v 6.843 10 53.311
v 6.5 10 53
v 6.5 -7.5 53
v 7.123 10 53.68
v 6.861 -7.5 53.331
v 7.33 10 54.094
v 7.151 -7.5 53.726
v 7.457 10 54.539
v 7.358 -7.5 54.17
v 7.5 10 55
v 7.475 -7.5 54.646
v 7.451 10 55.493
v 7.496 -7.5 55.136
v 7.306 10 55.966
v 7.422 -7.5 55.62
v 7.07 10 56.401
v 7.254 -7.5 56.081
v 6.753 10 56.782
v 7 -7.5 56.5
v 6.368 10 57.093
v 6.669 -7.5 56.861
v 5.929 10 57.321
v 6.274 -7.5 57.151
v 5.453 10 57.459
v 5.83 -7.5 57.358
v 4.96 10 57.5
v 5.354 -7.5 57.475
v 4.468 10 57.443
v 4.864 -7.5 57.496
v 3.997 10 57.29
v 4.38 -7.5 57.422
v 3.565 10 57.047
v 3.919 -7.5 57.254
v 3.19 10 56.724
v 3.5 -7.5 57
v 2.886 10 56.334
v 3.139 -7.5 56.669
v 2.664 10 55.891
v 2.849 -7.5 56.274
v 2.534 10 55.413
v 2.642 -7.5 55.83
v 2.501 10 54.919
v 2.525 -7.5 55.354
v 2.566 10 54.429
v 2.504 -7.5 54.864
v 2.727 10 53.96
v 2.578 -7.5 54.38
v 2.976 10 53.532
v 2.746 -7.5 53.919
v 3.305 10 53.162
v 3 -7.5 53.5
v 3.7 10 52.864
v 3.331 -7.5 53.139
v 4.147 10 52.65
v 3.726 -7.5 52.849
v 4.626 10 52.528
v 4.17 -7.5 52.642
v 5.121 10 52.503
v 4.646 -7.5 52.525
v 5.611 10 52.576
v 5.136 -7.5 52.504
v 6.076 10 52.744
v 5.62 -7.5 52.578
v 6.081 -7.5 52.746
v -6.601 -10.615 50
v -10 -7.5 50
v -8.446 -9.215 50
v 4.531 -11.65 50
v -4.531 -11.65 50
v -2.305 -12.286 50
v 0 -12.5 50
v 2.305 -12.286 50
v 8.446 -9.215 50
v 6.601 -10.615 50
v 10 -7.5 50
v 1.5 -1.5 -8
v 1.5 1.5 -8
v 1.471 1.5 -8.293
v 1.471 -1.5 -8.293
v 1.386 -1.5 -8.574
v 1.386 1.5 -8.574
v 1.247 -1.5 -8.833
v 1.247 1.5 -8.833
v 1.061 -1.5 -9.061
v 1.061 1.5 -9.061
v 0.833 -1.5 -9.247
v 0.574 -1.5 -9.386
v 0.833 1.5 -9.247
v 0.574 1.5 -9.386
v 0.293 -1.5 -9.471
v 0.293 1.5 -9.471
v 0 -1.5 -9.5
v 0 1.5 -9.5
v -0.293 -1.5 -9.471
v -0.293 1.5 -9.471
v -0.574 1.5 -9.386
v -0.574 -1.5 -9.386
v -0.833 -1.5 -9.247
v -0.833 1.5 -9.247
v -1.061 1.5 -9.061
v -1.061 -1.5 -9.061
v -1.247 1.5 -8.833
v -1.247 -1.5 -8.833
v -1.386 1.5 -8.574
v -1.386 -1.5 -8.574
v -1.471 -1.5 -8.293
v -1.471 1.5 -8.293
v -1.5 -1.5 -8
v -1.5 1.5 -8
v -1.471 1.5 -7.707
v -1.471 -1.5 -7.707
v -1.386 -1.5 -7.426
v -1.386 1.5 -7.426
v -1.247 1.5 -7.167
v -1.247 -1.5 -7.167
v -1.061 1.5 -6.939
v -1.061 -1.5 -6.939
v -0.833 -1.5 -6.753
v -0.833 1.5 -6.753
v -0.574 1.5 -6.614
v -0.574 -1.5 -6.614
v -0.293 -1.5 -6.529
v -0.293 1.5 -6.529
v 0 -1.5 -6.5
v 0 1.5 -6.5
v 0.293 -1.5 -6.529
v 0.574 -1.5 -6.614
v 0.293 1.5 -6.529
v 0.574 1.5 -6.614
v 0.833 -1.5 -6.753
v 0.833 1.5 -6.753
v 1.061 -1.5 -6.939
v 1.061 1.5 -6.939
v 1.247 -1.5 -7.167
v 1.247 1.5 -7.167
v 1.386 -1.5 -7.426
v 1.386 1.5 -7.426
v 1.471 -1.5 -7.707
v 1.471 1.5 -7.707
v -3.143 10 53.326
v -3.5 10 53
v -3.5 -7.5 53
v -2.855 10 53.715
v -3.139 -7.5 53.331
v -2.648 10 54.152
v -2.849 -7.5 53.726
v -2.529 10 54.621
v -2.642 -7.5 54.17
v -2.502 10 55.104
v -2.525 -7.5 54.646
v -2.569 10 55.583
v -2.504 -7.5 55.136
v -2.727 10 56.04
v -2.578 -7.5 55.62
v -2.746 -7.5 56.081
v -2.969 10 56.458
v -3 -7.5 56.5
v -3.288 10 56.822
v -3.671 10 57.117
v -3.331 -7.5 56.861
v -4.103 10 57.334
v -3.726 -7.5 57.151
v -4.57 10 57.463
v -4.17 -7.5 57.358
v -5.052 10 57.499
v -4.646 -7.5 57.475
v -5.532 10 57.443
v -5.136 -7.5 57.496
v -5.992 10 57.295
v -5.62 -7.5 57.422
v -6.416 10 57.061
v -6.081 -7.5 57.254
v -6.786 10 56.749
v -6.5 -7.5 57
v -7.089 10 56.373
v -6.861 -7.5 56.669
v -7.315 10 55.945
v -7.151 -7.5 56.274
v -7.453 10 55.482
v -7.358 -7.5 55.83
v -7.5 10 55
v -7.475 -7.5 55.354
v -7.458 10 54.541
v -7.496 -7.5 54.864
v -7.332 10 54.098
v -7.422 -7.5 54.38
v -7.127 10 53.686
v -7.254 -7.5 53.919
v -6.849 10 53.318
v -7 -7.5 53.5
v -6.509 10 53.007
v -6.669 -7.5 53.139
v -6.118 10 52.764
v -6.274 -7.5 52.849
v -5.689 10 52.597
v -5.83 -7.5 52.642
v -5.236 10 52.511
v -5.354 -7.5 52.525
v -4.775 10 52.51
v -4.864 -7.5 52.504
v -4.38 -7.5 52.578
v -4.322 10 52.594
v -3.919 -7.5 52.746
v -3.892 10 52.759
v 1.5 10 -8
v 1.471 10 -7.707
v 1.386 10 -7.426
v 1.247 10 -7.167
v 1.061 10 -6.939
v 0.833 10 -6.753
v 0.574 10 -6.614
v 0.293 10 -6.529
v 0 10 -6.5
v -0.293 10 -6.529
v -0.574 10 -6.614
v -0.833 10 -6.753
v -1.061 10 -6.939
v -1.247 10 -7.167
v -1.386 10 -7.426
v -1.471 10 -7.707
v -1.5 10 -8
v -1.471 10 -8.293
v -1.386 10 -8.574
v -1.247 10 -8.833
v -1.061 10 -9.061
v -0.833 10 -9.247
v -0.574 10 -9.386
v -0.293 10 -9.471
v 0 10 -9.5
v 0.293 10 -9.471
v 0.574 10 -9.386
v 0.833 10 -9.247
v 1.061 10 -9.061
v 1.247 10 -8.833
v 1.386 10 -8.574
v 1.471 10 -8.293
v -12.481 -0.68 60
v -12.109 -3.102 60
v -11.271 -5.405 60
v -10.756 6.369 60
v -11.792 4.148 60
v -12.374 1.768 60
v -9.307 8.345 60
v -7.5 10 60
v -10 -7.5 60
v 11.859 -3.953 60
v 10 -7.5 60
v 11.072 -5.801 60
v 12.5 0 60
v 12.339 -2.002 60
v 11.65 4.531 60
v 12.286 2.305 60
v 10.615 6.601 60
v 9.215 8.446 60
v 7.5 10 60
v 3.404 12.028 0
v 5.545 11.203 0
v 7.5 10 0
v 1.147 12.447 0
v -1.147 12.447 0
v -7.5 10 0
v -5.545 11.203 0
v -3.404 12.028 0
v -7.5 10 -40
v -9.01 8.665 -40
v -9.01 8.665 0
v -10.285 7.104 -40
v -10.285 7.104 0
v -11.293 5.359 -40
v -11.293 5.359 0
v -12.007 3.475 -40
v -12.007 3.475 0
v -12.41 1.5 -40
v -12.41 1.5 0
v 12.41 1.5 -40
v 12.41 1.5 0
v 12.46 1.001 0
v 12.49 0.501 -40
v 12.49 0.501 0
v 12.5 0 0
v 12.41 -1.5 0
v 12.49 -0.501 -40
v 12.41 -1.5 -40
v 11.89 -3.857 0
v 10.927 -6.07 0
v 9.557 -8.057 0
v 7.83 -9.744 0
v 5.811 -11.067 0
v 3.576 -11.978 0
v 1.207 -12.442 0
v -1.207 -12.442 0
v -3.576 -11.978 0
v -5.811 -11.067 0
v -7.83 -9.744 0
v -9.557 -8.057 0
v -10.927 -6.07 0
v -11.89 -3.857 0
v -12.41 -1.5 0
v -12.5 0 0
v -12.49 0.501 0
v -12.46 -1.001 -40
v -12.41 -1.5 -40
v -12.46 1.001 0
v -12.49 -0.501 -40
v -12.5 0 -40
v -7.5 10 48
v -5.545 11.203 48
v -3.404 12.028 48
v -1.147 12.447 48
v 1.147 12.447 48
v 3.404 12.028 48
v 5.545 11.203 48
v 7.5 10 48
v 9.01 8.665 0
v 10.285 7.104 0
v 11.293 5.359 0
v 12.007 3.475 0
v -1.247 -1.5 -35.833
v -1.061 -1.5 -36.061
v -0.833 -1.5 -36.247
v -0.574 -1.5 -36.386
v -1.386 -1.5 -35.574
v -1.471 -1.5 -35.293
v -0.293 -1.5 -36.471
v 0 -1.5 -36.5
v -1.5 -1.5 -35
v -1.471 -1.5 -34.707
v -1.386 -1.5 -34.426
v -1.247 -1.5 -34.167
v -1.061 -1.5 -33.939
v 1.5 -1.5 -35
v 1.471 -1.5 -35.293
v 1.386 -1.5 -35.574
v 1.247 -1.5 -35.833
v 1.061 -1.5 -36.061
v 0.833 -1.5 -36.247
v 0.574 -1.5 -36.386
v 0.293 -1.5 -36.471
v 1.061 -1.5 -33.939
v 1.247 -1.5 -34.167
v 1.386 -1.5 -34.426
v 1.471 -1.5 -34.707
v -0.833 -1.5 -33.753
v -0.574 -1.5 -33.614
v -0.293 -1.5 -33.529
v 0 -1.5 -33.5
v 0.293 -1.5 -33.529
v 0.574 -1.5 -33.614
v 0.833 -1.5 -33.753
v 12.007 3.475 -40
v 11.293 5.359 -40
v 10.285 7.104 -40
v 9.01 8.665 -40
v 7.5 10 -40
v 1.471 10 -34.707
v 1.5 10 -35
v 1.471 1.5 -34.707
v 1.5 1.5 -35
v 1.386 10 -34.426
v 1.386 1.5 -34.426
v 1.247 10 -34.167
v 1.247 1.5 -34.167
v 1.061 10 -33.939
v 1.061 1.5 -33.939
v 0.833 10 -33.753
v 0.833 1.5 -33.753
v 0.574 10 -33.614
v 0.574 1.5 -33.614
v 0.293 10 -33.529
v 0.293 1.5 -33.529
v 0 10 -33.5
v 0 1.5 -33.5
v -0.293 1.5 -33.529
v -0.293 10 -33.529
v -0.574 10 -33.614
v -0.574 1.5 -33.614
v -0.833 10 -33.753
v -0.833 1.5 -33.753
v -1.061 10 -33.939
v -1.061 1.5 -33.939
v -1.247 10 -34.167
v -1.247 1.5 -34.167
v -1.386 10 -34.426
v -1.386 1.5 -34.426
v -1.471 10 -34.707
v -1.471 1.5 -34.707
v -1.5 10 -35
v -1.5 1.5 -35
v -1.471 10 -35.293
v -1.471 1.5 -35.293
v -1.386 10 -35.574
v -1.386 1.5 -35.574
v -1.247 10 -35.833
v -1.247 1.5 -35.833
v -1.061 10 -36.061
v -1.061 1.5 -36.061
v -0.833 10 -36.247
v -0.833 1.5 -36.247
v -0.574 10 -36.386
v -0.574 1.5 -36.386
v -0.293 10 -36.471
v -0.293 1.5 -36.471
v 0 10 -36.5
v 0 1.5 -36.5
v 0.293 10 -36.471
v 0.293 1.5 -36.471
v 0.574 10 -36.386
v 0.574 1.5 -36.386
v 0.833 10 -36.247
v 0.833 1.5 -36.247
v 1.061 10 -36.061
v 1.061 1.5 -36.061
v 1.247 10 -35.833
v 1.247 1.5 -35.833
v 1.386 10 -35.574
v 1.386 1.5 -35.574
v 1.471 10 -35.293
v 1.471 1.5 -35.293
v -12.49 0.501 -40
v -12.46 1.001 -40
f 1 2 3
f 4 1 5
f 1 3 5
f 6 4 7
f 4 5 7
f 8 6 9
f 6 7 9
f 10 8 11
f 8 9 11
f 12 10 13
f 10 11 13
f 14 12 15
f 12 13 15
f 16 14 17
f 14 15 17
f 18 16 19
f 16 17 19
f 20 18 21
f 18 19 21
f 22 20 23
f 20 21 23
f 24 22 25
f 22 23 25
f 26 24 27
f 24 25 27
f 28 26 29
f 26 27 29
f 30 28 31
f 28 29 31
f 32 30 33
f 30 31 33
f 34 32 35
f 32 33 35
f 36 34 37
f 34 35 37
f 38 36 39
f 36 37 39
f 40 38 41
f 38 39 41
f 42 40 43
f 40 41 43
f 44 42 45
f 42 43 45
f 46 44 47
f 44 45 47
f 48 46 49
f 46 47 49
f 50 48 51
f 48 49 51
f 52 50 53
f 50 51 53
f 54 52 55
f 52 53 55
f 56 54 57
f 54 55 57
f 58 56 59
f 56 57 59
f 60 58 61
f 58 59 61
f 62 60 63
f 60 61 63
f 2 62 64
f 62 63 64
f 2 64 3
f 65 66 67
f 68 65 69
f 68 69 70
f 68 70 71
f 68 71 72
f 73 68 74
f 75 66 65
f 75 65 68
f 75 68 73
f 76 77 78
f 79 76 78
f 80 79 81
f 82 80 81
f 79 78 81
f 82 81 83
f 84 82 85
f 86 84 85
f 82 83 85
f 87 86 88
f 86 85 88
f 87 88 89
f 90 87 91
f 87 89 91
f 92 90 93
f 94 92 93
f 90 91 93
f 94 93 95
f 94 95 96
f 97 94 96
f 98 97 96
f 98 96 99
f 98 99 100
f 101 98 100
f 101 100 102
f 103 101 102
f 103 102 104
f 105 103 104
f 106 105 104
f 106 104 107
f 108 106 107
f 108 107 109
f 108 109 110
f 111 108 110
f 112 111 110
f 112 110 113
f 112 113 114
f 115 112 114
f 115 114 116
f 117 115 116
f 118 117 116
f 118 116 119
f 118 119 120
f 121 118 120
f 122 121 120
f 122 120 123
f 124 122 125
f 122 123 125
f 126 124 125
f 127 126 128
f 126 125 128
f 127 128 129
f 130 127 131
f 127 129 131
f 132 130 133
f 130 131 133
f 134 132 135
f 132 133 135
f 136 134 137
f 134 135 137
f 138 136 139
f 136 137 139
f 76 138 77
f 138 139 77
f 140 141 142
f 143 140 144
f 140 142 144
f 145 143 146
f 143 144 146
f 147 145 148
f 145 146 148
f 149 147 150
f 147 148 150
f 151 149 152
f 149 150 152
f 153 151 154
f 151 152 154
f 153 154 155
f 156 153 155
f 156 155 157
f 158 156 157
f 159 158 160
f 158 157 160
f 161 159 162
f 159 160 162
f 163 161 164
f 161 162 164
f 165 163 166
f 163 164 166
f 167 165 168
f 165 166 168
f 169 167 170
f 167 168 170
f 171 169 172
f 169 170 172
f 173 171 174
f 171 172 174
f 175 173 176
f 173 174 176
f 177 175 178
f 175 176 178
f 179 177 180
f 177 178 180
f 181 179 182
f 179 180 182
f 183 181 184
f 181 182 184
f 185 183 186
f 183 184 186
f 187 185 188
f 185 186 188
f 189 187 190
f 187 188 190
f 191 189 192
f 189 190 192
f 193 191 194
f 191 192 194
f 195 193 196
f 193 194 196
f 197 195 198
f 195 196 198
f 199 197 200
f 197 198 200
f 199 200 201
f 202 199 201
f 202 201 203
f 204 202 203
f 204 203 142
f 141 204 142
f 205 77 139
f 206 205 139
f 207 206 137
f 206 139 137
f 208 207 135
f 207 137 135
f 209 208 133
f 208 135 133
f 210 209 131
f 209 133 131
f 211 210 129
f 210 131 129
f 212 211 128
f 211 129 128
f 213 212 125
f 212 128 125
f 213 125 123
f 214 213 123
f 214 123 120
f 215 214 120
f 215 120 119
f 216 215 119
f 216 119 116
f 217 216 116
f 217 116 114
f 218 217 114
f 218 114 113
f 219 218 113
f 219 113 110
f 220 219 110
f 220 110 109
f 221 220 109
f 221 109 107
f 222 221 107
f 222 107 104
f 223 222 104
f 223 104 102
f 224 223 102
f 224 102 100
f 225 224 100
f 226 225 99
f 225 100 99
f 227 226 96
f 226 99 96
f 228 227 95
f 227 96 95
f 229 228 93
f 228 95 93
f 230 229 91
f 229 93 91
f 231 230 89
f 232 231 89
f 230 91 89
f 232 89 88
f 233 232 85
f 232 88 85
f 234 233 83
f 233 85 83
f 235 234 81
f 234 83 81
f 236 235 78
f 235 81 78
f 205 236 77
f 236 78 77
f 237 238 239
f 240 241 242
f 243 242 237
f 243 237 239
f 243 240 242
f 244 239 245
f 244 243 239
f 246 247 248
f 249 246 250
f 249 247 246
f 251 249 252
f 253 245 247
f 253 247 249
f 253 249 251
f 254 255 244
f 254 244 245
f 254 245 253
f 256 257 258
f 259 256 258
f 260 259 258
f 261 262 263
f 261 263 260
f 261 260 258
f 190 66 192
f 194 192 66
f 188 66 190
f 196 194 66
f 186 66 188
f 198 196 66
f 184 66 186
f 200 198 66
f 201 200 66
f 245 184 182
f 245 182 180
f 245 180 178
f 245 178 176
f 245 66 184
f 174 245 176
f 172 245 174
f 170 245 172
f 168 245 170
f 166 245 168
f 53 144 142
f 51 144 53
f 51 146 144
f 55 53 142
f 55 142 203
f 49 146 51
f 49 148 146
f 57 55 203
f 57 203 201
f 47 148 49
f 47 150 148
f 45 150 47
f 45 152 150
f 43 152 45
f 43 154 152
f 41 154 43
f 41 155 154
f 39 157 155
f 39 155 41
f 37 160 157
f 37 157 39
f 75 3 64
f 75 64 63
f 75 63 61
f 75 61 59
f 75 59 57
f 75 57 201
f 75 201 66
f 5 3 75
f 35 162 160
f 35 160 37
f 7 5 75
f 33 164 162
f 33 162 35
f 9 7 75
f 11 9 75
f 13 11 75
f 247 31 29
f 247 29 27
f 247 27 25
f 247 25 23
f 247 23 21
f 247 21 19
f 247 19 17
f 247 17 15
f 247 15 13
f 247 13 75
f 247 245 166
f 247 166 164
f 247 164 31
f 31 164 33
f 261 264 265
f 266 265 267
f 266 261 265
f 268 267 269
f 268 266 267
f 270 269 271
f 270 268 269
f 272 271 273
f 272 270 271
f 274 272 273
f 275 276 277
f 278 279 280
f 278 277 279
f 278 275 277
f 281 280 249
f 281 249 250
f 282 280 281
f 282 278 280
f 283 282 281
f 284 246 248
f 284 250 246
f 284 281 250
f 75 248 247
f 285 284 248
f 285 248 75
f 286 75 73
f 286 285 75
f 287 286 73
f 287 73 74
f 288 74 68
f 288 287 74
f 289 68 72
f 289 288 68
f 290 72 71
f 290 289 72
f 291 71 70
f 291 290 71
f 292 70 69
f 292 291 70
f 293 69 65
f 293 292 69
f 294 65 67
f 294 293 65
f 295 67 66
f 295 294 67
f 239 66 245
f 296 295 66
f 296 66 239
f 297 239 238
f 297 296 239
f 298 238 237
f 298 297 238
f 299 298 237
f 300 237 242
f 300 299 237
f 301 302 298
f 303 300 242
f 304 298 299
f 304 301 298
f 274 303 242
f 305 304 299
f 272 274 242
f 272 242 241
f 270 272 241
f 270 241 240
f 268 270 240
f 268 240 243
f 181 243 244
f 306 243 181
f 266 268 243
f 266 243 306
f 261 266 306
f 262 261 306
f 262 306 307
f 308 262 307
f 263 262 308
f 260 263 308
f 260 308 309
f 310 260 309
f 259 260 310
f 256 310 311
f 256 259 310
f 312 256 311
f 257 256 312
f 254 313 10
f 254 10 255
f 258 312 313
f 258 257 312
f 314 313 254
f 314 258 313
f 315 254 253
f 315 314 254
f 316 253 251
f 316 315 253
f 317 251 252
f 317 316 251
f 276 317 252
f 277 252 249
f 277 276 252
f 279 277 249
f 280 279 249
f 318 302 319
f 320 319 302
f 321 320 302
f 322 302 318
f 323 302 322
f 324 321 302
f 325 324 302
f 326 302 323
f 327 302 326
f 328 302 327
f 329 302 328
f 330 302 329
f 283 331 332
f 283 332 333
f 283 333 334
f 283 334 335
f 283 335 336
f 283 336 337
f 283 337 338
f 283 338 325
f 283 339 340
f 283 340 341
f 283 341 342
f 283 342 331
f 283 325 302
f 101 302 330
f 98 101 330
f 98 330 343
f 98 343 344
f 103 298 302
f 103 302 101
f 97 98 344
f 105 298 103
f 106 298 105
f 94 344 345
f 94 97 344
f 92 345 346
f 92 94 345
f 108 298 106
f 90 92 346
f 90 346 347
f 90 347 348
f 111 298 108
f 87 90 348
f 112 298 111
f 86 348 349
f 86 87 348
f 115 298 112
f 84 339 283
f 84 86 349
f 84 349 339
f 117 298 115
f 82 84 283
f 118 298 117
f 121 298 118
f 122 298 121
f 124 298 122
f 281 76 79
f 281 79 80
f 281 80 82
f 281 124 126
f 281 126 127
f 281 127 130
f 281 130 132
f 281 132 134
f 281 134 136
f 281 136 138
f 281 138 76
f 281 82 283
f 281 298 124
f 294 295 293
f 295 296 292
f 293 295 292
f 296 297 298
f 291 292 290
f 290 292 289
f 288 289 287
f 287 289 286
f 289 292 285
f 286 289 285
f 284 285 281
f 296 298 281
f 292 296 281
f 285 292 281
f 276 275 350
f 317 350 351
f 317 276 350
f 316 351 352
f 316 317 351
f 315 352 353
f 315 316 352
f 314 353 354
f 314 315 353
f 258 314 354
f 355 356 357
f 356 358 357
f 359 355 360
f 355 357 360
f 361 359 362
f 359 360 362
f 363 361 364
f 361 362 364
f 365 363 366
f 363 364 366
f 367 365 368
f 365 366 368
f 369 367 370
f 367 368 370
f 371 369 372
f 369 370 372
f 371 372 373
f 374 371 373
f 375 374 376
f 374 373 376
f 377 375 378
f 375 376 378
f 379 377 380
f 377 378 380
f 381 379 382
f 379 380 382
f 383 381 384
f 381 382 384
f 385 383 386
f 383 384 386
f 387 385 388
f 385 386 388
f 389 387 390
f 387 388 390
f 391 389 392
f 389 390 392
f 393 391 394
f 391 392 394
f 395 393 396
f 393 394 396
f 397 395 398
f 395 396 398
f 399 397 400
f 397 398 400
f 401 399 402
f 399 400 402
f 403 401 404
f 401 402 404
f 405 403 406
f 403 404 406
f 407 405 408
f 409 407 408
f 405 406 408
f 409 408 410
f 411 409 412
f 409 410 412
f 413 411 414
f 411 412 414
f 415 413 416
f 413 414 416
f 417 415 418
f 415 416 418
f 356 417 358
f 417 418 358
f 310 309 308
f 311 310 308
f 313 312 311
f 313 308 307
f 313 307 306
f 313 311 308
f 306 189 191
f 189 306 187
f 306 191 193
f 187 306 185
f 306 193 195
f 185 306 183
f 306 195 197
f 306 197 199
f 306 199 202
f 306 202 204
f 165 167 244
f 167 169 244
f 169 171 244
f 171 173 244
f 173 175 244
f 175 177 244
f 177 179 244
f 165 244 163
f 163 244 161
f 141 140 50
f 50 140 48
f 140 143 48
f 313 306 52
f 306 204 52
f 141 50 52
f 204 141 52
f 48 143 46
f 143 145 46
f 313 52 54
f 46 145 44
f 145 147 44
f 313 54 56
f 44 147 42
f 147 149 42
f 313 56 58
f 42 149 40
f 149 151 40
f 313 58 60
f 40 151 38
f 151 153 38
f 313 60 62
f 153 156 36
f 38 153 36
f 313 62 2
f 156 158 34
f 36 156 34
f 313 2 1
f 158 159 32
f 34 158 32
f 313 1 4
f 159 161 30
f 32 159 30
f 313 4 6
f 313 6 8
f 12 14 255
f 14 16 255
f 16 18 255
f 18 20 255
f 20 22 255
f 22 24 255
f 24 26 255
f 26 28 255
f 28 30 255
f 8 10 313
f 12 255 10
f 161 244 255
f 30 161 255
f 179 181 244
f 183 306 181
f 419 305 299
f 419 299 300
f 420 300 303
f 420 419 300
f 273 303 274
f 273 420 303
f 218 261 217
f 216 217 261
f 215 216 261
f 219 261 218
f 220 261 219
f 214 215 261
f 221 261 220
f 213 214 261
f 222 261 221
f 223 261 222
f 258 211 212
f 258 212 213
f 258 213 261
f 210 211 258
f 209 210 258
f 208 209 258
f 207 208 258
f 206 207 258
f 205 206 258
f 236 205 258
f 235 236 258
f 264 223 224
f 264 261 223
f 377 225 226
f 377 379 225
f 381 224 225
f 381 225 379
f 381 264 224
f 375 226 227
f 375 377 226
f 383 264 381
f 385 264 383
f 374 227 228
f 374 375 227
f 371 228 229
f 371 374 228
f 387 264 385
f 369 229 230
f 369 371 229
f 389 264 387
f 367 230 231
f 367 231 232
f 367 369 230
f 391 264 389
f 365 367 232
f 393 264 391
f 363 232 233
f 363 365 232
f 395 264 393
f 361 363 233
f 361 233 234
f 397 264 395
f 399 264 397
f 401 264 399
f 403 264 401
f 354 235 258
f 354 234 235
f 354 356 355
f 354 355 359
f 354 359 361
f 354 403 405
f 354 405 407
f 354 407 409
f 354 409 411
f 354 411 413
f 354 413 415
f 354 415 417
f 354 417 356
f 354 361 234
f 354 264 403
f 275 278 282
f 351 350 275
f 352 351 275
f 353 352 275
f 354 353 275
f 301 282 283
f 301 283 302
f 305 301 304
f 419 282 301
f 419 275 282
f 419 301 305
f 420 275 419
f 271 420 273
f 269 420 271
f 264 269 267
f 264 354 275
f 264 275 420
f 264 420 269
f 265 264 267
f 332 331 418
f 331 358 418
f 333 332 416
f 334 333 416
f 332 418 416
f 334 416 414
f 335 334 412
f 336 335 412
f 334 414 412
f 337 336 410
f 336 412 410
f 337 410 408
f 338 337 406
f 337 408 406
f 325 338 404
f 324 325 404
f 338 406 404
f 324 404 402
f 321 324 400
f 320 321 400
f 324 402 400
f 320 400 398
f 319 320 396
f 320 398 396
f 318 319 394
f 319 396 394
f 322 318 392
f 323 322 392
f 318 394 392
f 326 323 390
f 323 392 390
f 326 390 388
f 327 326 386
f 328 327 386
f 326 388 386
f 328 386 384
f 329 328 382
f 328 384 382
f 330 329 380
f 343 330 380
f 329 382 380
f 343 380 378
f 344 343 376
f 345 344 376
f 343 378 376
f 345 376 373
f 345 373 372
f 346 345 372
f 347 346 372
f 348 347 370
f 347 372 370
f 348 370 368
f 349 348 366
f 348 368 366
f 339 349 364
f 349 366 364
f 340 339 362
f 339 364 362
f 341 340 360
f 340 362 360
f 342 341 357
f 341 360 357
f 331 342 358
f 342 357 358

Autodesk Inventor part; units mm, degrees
ref_plane "YZ Plane" through (0, 0, 0) normal (1, 0, 0) x (0, 1, 0)
ref_plane "XZ Plane" through (0, 0, 0) normal (0, 1, 0) x (-1, 0, 0)
ref_plane "XY Plane" through (0, 0, 0) normal (0, 0, 1) x (1, 0, 0)
sketch "Sketch1" plane through (0, 0, 0) normal (0, 0, 1) x (1, 0, 0)
  circle A0 centre (0, 0) radius 12.5
  dimension "d0" = 25
extrude "Extrusion1" add sketch "Sketch1" along normal blind 60
sketch "Sketch14" plane through (0, 0, 0) normal (0, 0, -1) x (-1, 0, 0)
  line L0 (0, 0) -> (0, 1.5)
  circle A0 centre (0, 0) radius 12.5 projected
  line L1 (0, 1.5) -> (-12.4097, 1.5)
  line L2 (0, 0) -> (-1.8933, 0)
  line L3 (0, 1.5) -> (12.4097, 1.5)
  line L4 (0, -1.5) -> (-12.4097, -1.5)
  line L5 (0, -1.5) -> (12.4097, -1.5)
  dimension "d71" = 1.5
extrude "Extrusion10" add sketch "Sketch14" along normal blind 40 contours A0 L5 L4 L1 L3
sketch "Sketch16" plane through (0, 0, 60) normal (0, 0, 1) x (1, 0, 0)
  arc A0 (-12.4097, -1.5) -> (12.4097, -1.5) centre (0, 0) ccw projected
  line L0 (-10, -7.5) -> (10, -7.5)
  line L1 (12.4097, -1.5) -> (-12.4097, -1.5) projected
  dimension "d83" = 20
extrude "Extrusion12" cut sketch "Sketch16" against normal blind 10 contours L0 A0
sketch "Sketch17" plane through (0, 0, 0) normal (0, 0, -1) x (-1, 0, 0)
  line L0 (-12.4097, 1.5) -> (12.4097, 1.5) projected
  arc A0 (12.4097, 1.5) -> (-12.4097, 1.5) centre (0, 0) ccw projected
extrude "Extrusion13" add sketch "Sketch17" along normal up to surface (40 mm away)
sketch "Sketch15" plane through (-12.4097, 1.5, 0) normal (0, 1, 0) x (1, 0, 0)
  line L0 (0, 0) -> (0, 40) projected
  line L1 (0, 40) -> (24.8193, 40) projected
  circle A0 centre (12.4097, 35) radius 1.5
  circle A1 centre (12.4097, 8) radius 1.5
  point P0 (12.4097, 0)
  dimension "d79" = 3
  dimension "d80" = 5
  dimension "d81" = 3
  dimension "d82" = 27
extrude "Extrusion11" cut sketch "Sketch15" along normal mid plane 22
sketch "Sketch18" plane through (-10, -7.5, 60) normal (0, -1, 0) x (1, 0, 0)
  arc A0 (6.5, -7) -> (3.5, -7) centre (5, -5) ccw projected
  arc A1 (16.5, -7) -> (13.5, -7) centre (15, -5) ccw projected
  circle A2 centre (5, -5) radius 2.5
  circle A3 centre (15, -5) radius 2.5
  point P0 (10, -60)
  point P1 (13.5, -7)
  point P2 (16.5, -7)
  point P3 (3.5, -7)
  point P4 (6.5, -7)
extrude "Extrusion14" cut sketch "Sketch18" against normal blind 22
sketch "Sketch19" plane through (0, 0, -40) normal (0, 0, -1) x (-1, 0, 0)
  arc A0 (12.4097, -1.5) -> (-12.4097, -1.5) centre (0, 0) ccw projected
  line L0 (7.5, 10) -> (-7.5, 10)
  dimension "d90" = 15
extrude "Extrusion15" cut sketch "Sketch19" against normal blind 40
sketch "Sketch20" plane through (0, 0, 60) normal (0, 0, 1) x (1, 0, 0)
  arc A0 (10, -7.5) -> (-10, -7.5) centre (0, 0) ccw projected
  line L0 (-7.5, 10) -> (7.5, 10)
  dimension "d93" = 15
extrude "Extrusion16" cut sketch "Sketch20" against normal blind 12
properties part number "link2"
